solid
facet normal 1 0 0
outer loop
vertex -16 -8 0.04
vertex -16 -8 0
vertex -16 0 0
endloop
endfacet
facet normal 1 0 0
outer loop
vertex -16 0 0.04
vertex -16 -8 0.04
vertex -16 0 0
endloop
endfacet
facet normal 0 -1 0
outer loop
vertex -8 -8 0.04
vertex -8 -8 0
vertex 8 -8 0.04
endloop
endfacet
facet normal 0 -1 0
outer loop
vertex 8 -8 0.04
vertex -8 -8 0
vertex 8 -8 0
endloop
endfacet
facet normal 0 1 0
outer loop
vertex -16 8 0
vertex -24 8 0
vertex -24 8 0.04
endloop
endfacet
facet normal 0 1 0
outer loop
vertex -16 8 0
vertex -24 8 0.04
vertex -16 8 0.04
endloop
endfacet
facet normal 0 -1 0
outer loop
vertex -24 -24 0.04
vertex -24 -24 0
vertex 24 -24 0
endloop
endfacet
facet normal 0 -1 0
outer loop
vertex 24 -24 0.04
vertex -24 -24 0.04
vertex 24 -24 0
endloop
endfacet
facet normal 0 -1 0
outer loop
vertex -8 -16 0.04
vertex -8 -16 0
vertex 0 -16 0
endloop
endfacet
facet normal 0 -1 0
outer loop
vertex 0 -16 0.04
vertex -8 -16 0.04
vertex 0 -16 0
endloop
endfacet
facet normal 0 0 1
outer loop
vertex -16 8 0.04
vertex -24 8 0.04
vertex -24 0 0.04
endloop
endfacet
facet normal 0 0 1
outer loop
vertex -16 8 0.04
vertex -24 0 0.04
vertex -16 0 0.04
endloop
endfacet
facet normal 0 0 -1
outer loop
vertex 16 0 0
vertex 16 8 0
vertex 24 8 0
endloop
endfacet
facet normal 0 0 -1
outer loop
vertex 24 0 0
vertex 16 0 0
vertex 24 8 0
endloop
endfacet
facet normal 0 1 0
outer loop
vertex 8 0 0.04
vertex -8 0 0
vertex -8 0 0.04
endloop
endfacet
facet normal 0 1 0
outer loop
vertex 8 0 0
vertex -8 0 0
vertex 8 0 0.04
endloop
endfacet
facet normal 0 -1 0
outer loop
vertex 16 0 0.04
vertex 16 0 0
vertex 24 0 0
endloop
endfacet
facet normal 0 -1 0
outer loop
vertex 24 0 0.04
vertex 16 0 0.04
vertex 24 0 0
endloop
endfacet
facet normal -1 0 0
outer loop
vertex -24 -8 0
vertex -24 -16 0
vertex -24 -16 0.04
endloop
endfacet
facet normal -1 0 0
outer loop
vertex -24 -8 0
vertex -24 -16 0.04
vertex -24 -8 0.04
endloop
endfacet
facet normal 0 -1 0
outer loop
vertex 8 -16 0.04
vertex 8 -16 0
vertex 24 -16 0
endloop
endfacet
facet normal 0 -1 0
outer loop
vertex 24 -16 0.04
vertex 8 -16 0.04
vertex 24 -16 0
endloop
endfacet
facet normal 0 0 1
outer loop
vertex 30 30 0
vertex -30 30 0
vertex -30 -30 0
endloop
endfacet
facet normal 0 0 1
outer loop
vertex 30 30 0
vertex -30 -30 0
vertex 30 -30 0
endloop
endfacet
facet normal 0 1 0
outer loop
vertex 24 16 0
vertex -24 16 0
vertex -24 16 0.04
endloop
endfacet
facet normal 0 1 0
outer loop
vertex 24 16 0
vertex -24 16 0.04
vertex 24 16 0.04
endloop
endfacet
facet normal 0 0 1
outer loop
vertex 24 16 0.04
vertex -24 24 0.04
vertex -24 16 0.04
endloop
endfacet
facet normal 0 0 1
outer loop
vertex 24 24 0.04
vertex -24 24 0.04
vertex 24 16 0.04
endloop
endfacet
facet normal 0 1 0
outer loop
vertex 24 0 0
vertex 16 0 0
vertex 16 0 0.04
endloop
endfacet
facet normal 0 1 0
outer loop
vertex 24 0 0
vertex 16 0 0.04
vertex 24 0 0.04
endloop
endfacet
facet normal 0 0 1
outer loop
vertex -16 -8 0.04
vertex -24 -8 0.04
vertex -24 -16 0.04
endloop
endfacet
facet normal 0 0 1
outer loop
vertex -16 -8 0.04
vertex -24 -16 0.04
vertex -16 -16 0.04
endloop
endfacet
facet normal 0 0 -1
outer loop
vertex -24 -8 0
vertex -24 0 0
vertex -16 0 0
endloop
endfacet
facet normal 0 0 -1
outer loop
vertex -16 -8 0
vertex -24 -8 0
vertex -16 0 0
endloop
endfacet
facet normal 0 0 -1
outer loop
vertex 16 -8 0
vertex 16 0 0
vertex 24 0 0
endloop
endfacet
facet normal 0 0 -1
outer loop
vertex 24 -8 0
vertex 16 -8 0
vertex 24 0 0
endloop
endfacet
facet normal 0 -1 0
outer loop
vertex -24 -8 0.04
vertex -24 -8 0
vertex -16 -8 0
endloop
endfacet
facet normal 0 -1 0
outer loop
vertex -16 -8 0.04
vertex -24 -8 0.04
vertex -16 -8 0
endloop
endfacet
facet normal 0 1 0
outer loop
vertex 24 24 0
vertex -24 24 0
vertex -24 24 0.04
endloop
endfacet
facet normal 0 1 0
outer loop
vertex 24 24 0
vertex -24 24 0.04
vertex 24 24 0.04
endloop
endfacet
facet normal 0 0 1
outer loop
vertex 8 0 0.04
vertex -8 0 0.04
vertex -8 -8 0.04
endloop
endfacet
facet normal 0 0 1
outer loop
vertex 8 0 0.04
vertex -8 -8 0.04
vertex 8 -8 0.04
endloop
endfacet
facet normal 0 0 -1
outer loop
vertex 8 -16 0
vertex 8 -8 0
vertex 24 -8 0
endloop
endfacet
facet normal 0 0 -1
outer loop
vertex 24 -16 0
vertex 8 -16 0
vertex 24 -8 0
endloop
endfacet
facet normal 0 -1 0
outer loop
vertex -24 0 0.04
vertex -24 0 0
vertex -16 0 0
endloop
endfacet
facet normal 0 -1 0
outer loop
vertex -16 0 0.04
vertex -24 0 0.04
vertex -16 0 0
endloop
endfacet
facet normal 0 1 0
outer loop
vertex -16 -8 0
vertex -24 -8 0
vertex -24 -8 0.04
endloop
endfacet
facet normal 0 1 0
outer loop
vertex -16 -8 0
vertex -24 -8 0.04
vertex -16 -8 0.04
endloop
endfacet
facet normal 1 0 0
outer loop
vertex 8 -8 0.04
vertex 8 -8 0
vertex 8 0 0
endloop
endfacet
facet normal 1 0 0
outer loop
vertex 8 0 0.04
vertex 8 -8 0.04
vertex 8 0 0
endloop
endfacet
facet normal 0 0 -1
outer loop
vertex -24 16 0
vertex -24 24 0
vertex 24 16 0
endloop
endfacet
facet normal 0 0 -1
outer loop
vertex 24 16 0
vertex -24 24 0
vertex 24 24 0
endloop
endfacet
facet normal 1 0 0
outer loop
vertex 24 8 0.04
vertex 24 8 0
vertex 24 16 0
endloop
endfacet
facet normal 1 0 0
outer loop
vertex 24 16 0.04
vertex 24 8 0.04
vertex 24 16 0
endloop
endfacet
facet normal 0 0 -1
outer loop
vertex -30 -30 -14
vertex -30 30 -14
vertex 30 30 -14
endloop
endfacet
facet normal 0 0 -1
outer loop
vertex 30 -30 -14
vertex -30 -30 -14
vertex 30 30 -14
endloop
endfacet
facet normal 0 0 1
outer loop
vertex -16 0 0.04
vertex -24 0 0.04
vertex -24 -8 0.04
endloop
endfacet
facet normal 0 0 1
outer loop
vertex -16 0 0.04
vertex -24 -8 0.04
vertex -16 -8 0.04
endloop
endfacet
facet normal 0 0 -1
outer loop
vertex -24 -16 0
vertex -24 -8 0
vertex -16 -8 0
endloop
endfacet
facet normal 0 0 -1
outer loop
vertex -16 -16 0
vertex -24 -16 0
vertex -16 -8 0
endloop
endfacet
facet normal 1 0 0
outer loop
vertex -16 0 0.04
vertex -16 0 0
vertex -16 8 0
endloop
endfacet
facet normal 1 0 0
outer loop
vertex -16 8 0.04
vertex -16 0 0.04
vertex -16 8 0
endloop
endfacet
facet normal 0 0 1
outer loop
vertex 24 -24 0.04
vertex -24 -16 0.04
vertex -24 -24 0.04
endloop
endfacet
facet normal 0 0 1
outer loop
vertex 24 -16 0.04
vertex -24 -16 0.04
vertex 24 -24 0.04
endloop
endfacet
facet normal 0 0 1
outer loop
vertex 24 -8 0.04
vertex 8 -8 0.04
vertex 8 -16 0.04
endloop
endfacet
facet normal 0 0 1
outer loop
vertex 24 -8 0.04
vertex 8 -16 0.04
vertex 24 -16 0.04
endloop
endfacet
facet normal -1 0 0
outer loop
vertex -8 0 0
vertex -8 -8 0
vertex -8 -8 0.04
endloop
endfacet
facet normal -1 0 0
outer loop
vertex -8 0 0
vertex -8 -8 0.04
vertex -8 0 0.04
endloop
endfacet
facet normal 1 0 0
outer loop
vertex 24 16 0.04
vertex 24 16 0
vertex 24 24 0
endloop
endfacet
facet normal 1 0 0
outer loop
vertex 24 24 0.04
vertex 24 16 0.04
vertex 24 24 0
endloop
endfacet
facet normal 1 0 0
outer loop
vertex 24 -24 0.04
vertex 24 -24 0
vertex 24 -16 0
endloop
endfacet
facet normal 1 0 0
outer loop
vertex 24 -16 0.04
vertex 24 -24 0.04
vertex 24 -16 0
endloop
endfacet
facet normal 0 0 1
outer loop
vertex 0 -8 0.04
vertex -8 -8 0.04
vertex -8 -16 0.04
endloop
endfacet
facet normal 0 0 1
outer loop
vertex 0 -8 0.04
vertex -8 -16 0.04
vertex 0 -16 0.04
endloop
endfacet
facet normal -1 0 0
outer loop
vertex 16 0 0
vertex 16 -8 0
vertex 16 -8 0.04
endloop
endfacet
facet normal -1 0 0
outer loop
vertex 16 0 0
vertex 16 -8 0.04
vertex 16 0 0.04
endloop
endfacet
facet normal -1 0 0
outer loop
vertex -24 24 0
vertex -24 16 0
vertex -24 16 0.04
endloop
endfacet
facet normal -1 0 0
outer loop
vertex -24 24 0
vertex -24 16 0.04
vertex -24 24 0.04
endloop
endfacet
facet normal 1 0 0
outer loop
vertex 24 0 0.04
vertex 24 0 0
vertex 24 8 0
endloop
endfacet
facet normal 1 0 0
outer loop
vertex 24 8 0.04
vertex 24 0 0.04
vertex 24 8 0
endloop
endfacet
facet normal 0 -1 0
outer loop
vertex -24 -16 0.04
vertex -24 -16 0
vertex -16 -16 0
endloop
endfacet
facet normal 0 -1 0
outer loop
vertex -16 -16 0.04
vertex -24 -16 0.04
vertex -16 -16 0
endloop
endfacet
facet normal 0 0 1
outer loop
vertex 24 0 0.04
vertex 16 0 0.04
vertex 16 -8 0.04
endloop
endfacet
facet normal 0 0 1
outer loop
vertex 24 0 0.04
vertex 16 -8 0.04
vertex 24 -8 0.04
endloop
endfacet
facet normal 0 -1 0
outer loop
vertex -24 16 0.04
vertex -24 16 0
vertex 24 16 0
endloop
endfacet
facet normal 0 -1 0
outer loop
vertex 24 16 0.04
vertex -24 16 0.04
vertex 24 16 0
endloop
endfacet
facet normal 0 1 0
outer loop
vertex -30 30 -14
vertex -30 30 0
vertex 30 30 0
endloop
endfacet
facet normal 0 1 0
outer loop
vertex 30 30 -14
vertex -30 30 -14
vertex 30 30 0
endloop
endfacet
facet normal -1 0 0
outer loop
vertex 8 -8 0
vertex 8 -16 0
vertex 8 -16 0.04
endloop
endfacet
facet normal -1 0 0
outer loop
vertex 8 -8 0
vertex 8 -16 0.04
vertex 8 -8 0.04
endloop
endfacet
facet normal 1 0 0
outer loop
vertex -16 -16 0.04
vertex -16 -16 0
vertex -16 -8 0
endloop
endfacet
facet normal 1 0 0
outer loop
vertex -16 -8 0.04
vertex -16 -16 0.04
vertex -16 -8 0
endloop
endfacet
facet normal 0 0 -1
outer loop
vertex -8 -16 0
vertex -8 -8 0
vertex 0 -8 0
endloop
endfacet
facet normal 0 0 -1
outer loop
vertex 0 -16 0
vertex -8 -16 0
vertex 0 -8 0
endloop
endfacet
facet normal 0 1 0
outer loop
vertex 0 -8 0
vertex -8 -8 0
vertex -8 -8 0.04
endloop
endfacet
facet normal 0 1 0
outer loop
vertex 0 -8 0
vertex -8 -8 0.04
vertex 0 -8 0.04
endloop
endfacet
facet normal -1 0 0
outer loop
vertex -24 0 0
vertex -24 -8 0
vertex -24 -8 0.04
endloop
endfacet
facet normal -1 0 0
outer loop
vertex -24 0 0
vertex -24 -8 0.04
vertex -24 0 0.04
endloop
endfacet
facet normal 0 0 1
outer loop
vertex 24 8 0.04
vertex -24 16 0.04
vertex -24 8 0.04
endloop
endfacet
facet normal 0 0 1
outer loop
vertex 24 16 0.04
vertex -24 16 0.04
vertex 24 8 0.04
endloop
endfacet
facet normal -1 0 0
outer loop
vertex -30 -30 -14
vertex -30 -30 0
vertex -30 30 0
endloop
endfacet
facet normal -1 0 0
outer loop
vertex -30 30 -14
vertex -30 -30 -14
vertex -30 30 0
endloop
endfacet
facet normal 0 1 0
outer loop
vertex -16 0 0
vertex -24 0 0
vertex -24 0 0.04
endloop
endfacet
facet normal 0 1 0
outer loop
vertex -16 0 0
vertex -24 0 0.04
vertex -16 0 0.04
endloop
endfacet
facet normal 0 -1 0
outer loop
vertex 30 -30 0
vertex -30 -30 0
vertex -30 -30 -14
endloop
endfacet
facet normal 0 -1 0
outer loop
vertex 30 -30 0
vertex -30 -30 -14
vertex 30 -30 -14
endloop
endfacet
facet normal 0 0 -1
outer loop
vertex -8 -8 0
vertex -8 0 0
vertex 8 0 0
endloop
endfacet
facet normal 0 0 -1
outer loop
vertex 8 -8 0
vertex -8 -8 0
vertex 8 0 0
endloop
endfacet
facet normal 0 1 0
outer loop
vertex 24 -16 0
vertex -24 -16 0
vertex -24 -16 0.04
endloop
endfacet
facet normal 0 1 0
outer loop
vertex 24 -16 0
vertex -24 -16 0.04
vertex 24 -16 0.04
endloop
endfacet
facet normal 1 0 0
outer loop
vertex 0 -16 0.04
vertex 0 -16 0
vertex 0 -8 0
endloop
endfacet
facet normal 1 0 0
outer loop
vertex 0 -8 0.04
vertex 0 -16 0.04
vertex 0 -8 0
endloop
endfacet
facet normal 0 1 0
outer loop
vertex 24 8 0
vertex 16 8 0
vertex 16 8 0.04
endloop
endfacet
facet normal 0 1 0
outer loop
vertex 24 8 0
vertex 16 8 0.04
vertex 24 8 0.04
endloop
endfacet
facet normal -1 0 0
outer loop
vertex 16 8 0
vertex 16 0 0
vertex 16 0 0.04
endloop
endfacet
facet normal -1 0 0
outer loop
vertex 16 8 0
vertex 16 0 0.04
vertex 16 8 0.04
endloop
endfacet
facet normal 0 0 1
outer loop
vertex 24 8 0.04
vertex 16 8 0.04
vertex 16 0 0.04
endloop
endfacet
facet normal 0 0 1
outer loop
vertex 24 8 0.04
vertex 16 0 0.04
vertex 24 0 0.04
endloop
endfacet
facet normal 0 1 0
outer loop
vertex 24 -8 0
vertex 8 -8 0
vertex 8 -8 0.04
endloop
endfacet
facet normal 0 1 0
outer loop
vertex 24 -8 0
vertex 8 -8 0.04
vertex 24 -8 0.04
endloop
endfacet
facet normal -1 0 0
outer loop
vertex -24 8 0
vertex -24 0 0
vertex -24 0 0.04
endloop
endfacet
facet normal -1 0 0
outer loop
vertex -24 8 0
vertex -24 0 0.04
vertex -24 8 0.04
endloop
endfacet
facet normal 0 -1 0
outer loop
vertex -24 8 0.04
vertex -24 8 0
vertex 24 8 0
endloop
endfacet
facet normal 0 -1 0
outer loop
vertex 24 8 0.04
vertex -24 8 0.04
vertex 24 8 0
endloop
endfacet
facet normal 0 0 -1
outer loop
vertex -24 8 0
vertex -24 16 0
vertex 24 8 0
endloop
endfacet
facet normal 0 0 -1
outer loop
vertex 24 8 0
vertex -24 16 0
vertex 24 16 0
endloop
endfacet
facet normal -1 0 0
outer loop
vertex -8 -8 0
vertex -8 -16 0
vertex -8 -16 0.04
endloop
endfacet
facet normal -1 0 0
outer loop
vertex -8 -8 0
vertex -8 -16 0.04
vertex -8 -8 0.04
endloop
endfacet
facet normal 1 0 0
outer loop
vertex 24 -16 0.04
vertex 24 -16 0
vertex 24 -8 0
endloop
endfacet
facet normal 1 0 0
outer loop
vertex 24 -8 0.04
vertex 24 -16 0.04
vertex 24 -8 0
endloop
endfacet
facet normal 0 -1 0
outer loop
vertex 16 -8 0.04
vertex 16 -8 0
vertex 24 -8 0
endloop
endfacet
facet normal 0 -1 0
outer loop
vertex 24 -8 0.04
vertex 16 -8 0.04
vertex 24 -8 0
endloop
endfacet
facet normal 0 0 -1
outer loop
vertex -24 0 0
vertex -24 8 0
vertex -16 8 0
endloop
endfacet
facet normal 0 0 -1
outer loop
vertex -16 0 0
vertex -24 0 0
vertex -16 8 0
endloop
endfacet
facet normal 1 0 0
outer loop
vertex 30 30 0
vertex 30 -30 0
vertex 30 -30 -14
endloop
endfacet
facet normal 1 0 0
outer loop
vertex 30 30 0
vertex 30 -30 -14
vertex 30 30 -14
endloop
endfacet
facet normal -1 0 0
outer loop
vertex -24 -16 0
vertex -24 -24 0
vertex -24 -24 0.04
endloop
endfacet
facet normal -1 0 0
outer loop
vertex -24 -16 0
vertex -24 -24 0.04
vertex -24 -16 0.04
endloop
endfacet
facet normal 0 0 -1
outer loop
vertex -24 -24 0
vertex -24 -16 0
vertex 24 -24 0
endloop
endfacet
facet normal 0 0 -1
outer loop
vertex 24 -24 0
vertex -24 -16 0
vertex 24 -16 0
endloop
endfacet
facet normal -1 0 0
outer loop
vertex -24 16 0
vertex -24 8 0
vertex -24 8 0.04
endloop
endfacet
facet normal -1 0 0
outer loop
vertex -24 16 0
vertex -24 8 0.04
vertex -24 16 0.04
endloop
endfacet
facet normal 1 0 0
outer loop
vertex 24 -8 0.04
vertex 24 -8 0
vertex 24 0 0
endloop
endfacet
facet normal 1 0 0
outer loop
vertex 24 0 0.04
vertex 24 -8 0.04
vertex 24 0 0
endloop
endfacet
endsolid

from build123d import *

# Parameters (mm, degrees)
SKETCH_1_W                     = 60
SKETCH_1_H                     = 60
COPLANAR_SUPPORT60X60X14_DEPTH = 14
SKETCH_2_W                     = 48
SKETCH_2_H                     = 8
ID1_ROW0_DEPTH                 = 0.04
SKETCH_3_W                     = 48
SKETCH_3_H                     = 8
ID1_ROW1_DEPTH                 = 0.04
SKETCH_4_W                     = 8
SKETCH_4_H                     = 8
ID1_ROW2_DEPTH                 = 0.04
ID1_ROW2_2_DEPTH               = 0.04
SKETCH_5_W                     = 8
SKETCH_5_H                     = 8
ID1_ROW3_DEPTH                 = 0.04
SKETCH_5_W_2                   = 16
ID1_ROW3_2_DEPTH               = 0.04
ID1_ROW3_3_DEPTH               = 0.04
SKETCH_6_W                     = 8
SKETCH_6_H                     = 8
ID1_ROW4_DEPTH                 = 0.04
ID1_ROW4_2_DEPTH               = 0.04
SKETCH_6_W_2                   = 16
ID1_ROW4_3_DEPTH               = 0.04
SKETCH_7_W                     = 48
SKETCH_7_H                     = 8
ID1_ROW5_DEPTH                 = 0.04


with BuildPart() as part:
    # 草图1 → Coplanar_support60x60x14 (new body)
    with BuildSketch(Plane.XY):
        Rectangle(SKETCH_1_W, SKETCH_1_H)
    extrude(amount=-COPLANAR_SUPPORT60X60X14_DEPTH)


with BuildPart() as body_2:
    # 草图2 → ID1_row0 (new body)
    with BuildSketch(Plane.XY):
        with Locations((0, 20)):
            Rectangle(SKETCH_2_W, SKETCH_2_H)
    extrude(amount=ID1_ROW0_DEPTH)


with BuildPart() as body_3:
    # 草图3 → ID1_row1 (new body)
    with BuildSketch(Plane.XY):
        with Locations((0, 12)):
            Rectangle(SKETCH_3_W, SKETCH_3_H)
    extrude(amount=ID1_ROW1_DEPTH)


with BuildPart() as body_4:
    # 草图4 → ID1_row2 (new body)
    with BuildSketch(Plane.XY):
        with Locations((-20, 4)):
            Rectangle(SKETCH_4_W, SKETCH_4_H)
    extrude(amount=ID1_ROW2_DEPTH)


with BuildPart() as body_5:
    # 草图4 → ID1_row2 2 (new body)
    with BuildSketch(Plane.XY):
        with Locations((20, 4)):
            Rectangle(SKETCH_4_W, SKETCH_4_H)
    extrude(amount=ID1_ROW2_2_DEPTH)


with BuildPart() as body_6:
    # 草图5 → ID1_row3 (new body)
    with BuildSketch(Plane.XY):
        with Locations((-20, -4)):
            Rectangle(SKETCH_5_W, SKETCH_5_H)
    extrude(amount=ID1_ROW3_DEPTH)


with BuildPart() as body_7:
    # 草图5 → ID1_row3 2 (new body)
    with BuildSketch(Plane.XY):
        with Locations((0, -4)):
            Rectangle(SKETCH_5_W_2, SKETCH_5_H)
    extrude(amount=ID1_ROW3_2_DEPTH)


with BuildPart() as body_8:
    # 草图5 → ID1_row3 3 (new body)
    with BuildSketch(Plane.XY):
        with Locations((20, -4)):
            Rectangle(SKETCH_5_W, SKETCH_5_H)
    extrude(amount=ID1_ROW3_3_DEPTH)


with BuildPart() as body_9:
    # 草图6 → ID1_row4 (new body)
    with BuildSketch(Plane.XY):
        with Locations((-20, -12)):
            Rectangle(SKETCH_6_W, SKETCH_6_H)
    extrude(amount=ID1_ROW4_DEPTH)


with BuildPart() as body_10:
    # 草图6 → ID1_row4 2 (new body)
    with BuildSketch(Plane.XY):
        with Locations((-4, -12)):
            Rectangle(SKETCH_6_W, SKETCH_6_H)
    extrude(amount=ID1_ROW4_2_DEPTH)


with BuildPart() as body_11:
    # 草图6 → ID1_row4 3 (new body)
    with BuildSketch(Plane.XY):
        with Locations((16, -12)):
            Rectangle(SKETCH_6_W_2, SKETCH_6_H)
    extrude(amount=ID1_ROW4_3_DEPTH)


with BuildPart() as body_12:
    # 草图7 → ID1_row5 (new body)
    with BuildSketch(Plane.XY):
        with Locations((0, -20)):
            Rectangle(SKETCH_7_W, SKETCH_7_H)
    extrude(amount=ID1_ROW5_DEPTH)


solid = Compound([part.part, body_2.part, body_3.part, body_4.part, body_5.part, body_6.part, body_7.part, body_8.part, body_9.part, body_10.part, body_11.part, body_12.part])
